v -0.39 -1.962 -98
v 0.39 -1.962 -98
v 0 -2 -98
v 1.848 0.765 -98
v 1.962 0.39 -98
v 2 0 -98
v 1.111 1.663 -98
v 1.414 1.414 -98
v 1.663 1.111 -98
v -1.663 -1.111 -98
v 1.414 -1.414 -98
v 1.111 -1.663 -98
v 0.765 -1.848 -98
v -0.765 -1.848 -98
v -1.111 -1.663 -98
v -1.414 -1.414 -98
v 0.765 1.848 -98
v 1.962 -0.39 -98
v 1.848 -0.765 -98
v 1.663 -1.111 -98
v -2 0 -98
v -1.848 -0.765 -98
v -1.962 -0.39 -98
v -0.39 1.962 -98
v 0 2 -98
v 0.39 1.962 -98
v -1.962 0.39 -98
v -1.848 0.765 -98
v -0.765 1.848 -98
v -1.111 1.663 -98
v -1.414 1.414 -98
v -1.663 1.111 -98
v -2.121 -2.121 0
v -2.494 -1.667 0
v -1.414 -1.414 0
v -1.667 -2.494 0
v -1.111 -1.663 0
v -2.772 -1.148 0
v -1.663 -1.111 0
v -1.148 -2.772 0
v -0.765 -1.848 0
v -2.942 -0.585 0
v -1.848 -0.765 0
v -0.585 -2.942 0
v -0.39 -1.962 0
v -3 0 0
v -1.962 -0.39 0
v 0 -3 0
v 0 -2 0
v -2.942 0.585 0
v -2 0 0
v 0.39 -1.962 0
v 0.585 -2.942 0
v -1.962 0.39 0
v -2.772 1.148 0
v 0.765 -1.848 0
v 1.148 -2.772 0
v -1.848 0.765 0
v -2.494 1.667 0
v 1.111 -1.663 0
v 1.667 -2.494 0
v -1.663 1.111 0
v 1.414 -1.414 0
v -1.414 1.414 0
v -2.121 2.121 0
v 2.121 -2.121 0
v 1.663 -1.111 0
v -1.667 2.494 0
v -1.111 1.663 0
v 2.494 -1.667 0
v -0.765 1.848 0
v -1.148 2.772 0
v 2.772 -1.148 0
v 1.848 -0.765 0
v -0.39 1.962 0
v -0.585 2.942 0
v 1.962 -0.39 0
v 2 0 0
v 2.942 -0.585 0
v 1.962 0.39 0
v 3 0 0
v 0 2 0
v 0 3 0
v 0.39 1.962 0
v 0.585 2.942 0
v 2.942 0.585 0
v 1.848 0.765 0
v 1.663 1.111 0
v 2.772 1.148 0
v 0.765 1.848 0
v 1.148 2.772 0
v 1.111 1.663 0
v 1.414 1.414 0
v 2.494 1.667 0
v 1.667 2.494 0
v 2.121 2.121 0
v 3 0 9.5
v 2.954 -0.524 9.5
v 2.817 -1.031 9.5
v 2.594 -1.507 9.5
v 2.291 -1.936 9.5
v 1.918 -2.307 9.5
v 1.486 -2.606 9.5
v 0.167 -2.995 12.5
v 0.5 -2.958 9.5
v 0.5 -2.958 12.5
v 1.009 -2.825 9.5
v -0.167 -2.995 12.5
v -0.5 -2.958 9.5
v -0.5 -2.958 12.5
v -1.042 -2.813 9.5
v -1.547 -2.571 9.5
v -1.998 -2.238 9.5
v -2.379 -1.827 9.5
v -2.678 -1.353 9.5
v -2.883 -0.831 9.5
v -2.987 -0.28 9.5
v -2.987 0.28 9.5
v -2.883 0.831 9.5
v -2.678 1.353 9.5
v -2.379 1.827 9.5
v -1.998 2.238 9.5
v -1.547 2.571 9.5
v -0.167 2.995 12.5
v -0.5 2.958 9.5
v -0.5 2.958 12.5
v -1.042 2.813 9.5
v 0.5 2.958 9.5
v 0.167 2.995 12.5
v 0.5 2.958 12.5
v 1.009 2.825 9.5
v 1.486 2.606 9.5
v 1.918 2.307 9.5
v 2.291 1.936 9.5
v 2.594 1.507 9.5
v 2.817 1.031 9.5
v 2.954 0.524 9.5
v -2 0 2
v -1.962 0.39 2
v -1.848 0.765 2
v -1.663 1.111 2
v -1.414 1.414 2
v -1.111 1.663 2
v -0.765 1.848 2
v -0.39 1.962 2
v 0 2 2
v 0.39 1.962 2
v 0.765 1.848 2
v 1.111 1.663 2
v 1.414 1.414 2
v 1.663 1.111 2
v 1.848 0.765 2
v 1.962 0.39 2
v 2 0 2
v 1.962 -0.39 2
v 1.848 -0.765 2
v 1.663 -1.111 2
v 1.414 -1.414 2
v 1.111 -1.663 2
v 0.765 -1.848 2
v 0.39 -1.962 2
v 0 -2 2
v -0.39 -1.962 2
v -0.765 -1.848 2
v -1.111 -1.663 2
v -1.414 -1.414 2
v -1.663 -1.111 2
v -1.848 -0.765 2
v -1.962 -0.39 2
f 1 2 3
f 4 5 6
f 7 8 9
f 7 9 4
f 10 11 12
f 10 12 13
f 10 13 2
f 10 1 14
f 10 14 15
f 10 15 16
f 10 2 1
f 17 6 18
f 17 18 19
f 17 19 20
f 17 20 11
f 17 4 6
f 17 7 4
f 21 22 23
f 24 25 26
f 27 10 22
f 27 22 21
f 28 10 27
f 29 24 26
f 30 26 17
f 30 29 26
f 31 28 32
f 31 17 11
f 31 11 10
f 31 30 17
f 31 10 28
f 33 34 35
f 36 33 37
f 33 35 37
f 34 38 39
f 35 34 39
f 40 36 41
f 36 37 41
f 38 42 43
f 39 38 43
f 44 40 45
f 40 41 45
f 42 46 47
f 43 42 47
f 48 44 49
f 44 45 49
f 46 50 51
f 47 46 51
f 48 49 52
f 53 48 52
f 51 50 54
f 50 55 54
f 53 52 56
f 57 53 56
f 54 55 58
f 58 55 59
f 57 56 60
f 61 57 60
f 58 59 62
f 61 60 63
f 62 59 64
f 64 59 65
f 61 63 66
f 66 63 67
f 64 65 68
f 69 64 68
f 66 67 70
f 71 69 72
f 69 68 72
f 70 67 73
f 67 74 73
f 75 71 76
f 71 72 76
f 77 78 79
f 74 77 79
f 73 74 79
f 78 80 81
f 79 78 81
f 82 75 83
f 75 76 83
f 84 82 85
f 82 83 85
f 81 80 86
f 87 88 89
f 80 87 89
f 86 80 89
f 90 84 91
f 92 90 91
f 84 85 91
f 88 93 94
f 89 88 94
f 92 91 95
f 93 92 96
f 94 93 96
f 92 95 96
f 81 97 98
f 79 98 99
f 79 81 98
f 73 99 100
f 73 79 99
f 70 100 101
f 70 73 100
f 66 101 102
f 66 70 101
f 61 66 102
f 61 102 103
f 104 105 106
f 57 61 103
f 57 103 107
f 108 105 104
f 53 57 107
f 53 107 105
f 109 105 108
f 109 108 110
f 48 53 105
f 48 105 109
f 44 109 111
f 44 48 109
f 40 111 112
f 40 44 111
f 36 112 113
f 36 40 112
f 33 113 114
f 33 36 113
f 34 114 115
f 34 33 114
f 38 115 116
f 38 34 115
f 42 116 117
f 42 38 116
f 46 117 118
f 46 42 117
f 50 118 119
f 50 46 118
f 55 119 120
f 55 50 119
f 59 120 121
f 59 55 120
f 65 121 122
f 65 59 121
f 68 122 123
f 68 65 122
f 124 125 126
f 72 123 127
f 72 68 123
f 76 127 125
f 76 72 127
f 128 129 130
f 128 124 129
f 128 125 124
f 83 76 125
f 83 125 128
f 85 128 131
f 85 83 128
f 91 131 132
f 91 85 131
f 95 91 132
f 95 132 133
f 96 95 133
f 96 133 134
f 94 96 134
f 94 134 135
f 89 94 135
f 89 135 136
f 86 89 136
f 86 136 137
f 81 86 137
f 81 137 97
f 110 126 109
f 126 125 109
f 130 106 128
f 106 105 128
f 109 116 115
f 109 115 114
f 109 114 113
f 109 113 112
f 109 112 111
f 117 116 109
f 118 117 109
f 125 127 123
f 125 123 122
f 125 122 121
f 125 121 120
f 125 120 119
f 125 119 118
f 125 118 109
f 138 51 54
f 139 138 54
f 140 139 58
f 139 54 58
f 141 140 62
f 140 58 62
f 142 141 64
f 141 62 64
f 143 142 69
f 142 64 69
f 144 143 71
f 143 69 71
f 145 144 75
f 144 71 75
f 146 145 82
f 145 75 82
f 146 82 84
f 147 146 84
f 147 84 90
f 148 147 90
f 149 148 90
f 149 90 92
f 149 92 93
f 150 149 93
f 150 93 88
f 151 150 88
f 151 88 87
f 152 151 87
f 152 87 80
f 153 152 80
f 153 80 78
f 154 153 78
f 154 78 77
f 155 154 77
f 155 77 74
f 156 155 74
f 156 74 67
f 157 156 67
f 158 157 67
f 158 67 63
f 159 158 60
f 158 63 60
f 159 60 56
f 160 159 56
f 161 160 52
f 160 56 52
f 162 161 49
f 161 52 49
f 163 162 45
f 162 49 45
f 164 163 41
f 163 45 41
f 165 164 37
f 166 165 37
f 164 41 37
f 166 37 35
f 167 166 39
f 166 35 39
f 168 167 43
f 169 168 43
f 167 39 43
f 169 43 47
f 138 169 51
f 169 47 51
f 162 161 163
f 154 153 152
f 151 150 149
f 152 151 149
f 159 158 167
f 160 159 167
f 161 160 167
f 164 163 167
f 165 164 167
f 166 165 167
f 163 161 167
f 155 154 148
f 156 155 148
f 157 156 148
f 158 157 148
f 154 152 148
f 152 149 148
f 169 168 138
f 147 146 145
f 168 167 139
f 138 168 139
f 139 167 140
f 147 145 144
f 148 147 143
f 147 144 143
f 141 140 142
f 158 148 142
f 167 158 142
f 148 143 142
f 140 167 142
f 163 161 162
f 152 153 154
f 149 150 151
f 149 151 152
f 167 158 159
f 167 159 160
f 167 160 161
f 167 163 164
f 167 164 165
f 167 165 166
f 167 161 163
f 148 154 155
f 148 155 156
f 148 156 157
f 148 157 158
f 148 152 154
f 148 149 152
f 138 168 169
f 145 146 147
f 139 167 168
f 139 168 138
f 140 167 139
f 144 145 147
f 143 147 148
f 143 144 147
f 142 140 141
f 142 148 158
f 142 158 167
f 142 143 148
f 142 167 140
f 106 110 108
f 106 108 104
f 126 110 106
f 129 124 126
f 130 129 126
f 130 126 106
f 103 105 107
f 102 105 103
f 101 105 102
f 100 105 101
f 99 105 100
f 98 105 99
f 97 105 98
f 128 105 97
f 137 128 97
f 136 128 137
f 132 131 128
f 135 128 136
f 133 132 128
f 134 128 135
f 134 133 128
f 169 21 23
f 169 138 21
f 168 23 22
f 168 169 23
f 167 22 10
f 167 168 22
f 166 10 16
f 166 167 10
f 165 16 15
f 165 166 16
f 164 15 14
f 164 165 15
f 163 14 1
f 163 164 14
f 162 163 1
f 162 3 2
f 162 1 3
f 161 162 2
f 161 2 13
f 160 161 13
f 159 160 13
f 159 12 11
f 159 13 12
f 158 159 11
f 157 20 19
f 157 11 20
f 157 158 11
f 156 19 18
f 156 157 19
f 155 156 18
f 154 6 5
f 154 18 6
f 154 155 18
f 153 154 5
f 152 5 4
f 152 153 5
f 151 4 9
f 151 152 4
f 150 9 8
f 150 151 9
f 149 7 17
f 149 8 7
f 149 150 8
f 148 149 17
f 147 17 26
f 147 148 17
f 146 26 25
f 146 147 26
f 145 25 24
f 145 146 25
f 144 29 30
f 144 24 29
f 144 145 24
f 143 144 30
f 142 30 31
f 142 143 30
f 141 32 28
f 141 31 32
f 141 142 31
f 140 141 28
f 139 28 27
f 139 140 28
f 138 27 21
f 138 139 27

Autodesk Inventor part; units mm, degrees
ref_plane "YZ Plane" through (0, 0, 0) normal (1, 0, 0) x (0, 1, 0)
ref_plane "XZ Plane" through (0, 0, 0) normal (0, 1, 0) x (-1, 0, 0)
ref_plane "XY Plane" through (0, 0, 0) normal (0, 0, 1) x (1, 0, 0)
sketch "Эскиз1" plane through (0, 0, 0) normal (0, 0, 1) x (1, 0, 0)
  circle A0 centre (0, 0) radius 3
  dimension "d0" = 6
extrude "Выдавливание1" add sketch "Эскиз1" along normal blind 9.5
sketch "Эскиз2" plane through (0, 0, 9.5) normal (0, 0, 1) x (1, 0, 0)
  circle A0 centre (0, 0) radius 3 projected
  line L0 (-0.5, 2.958) -> (-0.5, -2.958)
  line L1 (0.5, -2.958) -> (0.5, 2.958)
  line L2 (0, 0) -> (0, 0.4981) construction
  dimension "d3" = 1
extrude "Выдавливание2" add sketch "Эскиз2" along normal blind 3 contours L1 A0 L0
sketch "Эскиз3" plane through (0, 0, 0) normal (0, 0, -1) x (-1, 0, 0)
  circle A0 centre (0, 0) radius 2
  dimension "d6" = 4
extrude "Выдавливание3" cut sketch "Эскиз3" against normal blind 2
sketch "Эскиз4" plane through (0, 0, 2) normal (0, 0, -1) x (-1, 0, 0)
  circle A0 centre (0, 0) radius 2 projected
extrude "Выдавливание4" add sketch "Эскиз4" along normal blind 100 separate body
properties part number "Лазер маленький"
